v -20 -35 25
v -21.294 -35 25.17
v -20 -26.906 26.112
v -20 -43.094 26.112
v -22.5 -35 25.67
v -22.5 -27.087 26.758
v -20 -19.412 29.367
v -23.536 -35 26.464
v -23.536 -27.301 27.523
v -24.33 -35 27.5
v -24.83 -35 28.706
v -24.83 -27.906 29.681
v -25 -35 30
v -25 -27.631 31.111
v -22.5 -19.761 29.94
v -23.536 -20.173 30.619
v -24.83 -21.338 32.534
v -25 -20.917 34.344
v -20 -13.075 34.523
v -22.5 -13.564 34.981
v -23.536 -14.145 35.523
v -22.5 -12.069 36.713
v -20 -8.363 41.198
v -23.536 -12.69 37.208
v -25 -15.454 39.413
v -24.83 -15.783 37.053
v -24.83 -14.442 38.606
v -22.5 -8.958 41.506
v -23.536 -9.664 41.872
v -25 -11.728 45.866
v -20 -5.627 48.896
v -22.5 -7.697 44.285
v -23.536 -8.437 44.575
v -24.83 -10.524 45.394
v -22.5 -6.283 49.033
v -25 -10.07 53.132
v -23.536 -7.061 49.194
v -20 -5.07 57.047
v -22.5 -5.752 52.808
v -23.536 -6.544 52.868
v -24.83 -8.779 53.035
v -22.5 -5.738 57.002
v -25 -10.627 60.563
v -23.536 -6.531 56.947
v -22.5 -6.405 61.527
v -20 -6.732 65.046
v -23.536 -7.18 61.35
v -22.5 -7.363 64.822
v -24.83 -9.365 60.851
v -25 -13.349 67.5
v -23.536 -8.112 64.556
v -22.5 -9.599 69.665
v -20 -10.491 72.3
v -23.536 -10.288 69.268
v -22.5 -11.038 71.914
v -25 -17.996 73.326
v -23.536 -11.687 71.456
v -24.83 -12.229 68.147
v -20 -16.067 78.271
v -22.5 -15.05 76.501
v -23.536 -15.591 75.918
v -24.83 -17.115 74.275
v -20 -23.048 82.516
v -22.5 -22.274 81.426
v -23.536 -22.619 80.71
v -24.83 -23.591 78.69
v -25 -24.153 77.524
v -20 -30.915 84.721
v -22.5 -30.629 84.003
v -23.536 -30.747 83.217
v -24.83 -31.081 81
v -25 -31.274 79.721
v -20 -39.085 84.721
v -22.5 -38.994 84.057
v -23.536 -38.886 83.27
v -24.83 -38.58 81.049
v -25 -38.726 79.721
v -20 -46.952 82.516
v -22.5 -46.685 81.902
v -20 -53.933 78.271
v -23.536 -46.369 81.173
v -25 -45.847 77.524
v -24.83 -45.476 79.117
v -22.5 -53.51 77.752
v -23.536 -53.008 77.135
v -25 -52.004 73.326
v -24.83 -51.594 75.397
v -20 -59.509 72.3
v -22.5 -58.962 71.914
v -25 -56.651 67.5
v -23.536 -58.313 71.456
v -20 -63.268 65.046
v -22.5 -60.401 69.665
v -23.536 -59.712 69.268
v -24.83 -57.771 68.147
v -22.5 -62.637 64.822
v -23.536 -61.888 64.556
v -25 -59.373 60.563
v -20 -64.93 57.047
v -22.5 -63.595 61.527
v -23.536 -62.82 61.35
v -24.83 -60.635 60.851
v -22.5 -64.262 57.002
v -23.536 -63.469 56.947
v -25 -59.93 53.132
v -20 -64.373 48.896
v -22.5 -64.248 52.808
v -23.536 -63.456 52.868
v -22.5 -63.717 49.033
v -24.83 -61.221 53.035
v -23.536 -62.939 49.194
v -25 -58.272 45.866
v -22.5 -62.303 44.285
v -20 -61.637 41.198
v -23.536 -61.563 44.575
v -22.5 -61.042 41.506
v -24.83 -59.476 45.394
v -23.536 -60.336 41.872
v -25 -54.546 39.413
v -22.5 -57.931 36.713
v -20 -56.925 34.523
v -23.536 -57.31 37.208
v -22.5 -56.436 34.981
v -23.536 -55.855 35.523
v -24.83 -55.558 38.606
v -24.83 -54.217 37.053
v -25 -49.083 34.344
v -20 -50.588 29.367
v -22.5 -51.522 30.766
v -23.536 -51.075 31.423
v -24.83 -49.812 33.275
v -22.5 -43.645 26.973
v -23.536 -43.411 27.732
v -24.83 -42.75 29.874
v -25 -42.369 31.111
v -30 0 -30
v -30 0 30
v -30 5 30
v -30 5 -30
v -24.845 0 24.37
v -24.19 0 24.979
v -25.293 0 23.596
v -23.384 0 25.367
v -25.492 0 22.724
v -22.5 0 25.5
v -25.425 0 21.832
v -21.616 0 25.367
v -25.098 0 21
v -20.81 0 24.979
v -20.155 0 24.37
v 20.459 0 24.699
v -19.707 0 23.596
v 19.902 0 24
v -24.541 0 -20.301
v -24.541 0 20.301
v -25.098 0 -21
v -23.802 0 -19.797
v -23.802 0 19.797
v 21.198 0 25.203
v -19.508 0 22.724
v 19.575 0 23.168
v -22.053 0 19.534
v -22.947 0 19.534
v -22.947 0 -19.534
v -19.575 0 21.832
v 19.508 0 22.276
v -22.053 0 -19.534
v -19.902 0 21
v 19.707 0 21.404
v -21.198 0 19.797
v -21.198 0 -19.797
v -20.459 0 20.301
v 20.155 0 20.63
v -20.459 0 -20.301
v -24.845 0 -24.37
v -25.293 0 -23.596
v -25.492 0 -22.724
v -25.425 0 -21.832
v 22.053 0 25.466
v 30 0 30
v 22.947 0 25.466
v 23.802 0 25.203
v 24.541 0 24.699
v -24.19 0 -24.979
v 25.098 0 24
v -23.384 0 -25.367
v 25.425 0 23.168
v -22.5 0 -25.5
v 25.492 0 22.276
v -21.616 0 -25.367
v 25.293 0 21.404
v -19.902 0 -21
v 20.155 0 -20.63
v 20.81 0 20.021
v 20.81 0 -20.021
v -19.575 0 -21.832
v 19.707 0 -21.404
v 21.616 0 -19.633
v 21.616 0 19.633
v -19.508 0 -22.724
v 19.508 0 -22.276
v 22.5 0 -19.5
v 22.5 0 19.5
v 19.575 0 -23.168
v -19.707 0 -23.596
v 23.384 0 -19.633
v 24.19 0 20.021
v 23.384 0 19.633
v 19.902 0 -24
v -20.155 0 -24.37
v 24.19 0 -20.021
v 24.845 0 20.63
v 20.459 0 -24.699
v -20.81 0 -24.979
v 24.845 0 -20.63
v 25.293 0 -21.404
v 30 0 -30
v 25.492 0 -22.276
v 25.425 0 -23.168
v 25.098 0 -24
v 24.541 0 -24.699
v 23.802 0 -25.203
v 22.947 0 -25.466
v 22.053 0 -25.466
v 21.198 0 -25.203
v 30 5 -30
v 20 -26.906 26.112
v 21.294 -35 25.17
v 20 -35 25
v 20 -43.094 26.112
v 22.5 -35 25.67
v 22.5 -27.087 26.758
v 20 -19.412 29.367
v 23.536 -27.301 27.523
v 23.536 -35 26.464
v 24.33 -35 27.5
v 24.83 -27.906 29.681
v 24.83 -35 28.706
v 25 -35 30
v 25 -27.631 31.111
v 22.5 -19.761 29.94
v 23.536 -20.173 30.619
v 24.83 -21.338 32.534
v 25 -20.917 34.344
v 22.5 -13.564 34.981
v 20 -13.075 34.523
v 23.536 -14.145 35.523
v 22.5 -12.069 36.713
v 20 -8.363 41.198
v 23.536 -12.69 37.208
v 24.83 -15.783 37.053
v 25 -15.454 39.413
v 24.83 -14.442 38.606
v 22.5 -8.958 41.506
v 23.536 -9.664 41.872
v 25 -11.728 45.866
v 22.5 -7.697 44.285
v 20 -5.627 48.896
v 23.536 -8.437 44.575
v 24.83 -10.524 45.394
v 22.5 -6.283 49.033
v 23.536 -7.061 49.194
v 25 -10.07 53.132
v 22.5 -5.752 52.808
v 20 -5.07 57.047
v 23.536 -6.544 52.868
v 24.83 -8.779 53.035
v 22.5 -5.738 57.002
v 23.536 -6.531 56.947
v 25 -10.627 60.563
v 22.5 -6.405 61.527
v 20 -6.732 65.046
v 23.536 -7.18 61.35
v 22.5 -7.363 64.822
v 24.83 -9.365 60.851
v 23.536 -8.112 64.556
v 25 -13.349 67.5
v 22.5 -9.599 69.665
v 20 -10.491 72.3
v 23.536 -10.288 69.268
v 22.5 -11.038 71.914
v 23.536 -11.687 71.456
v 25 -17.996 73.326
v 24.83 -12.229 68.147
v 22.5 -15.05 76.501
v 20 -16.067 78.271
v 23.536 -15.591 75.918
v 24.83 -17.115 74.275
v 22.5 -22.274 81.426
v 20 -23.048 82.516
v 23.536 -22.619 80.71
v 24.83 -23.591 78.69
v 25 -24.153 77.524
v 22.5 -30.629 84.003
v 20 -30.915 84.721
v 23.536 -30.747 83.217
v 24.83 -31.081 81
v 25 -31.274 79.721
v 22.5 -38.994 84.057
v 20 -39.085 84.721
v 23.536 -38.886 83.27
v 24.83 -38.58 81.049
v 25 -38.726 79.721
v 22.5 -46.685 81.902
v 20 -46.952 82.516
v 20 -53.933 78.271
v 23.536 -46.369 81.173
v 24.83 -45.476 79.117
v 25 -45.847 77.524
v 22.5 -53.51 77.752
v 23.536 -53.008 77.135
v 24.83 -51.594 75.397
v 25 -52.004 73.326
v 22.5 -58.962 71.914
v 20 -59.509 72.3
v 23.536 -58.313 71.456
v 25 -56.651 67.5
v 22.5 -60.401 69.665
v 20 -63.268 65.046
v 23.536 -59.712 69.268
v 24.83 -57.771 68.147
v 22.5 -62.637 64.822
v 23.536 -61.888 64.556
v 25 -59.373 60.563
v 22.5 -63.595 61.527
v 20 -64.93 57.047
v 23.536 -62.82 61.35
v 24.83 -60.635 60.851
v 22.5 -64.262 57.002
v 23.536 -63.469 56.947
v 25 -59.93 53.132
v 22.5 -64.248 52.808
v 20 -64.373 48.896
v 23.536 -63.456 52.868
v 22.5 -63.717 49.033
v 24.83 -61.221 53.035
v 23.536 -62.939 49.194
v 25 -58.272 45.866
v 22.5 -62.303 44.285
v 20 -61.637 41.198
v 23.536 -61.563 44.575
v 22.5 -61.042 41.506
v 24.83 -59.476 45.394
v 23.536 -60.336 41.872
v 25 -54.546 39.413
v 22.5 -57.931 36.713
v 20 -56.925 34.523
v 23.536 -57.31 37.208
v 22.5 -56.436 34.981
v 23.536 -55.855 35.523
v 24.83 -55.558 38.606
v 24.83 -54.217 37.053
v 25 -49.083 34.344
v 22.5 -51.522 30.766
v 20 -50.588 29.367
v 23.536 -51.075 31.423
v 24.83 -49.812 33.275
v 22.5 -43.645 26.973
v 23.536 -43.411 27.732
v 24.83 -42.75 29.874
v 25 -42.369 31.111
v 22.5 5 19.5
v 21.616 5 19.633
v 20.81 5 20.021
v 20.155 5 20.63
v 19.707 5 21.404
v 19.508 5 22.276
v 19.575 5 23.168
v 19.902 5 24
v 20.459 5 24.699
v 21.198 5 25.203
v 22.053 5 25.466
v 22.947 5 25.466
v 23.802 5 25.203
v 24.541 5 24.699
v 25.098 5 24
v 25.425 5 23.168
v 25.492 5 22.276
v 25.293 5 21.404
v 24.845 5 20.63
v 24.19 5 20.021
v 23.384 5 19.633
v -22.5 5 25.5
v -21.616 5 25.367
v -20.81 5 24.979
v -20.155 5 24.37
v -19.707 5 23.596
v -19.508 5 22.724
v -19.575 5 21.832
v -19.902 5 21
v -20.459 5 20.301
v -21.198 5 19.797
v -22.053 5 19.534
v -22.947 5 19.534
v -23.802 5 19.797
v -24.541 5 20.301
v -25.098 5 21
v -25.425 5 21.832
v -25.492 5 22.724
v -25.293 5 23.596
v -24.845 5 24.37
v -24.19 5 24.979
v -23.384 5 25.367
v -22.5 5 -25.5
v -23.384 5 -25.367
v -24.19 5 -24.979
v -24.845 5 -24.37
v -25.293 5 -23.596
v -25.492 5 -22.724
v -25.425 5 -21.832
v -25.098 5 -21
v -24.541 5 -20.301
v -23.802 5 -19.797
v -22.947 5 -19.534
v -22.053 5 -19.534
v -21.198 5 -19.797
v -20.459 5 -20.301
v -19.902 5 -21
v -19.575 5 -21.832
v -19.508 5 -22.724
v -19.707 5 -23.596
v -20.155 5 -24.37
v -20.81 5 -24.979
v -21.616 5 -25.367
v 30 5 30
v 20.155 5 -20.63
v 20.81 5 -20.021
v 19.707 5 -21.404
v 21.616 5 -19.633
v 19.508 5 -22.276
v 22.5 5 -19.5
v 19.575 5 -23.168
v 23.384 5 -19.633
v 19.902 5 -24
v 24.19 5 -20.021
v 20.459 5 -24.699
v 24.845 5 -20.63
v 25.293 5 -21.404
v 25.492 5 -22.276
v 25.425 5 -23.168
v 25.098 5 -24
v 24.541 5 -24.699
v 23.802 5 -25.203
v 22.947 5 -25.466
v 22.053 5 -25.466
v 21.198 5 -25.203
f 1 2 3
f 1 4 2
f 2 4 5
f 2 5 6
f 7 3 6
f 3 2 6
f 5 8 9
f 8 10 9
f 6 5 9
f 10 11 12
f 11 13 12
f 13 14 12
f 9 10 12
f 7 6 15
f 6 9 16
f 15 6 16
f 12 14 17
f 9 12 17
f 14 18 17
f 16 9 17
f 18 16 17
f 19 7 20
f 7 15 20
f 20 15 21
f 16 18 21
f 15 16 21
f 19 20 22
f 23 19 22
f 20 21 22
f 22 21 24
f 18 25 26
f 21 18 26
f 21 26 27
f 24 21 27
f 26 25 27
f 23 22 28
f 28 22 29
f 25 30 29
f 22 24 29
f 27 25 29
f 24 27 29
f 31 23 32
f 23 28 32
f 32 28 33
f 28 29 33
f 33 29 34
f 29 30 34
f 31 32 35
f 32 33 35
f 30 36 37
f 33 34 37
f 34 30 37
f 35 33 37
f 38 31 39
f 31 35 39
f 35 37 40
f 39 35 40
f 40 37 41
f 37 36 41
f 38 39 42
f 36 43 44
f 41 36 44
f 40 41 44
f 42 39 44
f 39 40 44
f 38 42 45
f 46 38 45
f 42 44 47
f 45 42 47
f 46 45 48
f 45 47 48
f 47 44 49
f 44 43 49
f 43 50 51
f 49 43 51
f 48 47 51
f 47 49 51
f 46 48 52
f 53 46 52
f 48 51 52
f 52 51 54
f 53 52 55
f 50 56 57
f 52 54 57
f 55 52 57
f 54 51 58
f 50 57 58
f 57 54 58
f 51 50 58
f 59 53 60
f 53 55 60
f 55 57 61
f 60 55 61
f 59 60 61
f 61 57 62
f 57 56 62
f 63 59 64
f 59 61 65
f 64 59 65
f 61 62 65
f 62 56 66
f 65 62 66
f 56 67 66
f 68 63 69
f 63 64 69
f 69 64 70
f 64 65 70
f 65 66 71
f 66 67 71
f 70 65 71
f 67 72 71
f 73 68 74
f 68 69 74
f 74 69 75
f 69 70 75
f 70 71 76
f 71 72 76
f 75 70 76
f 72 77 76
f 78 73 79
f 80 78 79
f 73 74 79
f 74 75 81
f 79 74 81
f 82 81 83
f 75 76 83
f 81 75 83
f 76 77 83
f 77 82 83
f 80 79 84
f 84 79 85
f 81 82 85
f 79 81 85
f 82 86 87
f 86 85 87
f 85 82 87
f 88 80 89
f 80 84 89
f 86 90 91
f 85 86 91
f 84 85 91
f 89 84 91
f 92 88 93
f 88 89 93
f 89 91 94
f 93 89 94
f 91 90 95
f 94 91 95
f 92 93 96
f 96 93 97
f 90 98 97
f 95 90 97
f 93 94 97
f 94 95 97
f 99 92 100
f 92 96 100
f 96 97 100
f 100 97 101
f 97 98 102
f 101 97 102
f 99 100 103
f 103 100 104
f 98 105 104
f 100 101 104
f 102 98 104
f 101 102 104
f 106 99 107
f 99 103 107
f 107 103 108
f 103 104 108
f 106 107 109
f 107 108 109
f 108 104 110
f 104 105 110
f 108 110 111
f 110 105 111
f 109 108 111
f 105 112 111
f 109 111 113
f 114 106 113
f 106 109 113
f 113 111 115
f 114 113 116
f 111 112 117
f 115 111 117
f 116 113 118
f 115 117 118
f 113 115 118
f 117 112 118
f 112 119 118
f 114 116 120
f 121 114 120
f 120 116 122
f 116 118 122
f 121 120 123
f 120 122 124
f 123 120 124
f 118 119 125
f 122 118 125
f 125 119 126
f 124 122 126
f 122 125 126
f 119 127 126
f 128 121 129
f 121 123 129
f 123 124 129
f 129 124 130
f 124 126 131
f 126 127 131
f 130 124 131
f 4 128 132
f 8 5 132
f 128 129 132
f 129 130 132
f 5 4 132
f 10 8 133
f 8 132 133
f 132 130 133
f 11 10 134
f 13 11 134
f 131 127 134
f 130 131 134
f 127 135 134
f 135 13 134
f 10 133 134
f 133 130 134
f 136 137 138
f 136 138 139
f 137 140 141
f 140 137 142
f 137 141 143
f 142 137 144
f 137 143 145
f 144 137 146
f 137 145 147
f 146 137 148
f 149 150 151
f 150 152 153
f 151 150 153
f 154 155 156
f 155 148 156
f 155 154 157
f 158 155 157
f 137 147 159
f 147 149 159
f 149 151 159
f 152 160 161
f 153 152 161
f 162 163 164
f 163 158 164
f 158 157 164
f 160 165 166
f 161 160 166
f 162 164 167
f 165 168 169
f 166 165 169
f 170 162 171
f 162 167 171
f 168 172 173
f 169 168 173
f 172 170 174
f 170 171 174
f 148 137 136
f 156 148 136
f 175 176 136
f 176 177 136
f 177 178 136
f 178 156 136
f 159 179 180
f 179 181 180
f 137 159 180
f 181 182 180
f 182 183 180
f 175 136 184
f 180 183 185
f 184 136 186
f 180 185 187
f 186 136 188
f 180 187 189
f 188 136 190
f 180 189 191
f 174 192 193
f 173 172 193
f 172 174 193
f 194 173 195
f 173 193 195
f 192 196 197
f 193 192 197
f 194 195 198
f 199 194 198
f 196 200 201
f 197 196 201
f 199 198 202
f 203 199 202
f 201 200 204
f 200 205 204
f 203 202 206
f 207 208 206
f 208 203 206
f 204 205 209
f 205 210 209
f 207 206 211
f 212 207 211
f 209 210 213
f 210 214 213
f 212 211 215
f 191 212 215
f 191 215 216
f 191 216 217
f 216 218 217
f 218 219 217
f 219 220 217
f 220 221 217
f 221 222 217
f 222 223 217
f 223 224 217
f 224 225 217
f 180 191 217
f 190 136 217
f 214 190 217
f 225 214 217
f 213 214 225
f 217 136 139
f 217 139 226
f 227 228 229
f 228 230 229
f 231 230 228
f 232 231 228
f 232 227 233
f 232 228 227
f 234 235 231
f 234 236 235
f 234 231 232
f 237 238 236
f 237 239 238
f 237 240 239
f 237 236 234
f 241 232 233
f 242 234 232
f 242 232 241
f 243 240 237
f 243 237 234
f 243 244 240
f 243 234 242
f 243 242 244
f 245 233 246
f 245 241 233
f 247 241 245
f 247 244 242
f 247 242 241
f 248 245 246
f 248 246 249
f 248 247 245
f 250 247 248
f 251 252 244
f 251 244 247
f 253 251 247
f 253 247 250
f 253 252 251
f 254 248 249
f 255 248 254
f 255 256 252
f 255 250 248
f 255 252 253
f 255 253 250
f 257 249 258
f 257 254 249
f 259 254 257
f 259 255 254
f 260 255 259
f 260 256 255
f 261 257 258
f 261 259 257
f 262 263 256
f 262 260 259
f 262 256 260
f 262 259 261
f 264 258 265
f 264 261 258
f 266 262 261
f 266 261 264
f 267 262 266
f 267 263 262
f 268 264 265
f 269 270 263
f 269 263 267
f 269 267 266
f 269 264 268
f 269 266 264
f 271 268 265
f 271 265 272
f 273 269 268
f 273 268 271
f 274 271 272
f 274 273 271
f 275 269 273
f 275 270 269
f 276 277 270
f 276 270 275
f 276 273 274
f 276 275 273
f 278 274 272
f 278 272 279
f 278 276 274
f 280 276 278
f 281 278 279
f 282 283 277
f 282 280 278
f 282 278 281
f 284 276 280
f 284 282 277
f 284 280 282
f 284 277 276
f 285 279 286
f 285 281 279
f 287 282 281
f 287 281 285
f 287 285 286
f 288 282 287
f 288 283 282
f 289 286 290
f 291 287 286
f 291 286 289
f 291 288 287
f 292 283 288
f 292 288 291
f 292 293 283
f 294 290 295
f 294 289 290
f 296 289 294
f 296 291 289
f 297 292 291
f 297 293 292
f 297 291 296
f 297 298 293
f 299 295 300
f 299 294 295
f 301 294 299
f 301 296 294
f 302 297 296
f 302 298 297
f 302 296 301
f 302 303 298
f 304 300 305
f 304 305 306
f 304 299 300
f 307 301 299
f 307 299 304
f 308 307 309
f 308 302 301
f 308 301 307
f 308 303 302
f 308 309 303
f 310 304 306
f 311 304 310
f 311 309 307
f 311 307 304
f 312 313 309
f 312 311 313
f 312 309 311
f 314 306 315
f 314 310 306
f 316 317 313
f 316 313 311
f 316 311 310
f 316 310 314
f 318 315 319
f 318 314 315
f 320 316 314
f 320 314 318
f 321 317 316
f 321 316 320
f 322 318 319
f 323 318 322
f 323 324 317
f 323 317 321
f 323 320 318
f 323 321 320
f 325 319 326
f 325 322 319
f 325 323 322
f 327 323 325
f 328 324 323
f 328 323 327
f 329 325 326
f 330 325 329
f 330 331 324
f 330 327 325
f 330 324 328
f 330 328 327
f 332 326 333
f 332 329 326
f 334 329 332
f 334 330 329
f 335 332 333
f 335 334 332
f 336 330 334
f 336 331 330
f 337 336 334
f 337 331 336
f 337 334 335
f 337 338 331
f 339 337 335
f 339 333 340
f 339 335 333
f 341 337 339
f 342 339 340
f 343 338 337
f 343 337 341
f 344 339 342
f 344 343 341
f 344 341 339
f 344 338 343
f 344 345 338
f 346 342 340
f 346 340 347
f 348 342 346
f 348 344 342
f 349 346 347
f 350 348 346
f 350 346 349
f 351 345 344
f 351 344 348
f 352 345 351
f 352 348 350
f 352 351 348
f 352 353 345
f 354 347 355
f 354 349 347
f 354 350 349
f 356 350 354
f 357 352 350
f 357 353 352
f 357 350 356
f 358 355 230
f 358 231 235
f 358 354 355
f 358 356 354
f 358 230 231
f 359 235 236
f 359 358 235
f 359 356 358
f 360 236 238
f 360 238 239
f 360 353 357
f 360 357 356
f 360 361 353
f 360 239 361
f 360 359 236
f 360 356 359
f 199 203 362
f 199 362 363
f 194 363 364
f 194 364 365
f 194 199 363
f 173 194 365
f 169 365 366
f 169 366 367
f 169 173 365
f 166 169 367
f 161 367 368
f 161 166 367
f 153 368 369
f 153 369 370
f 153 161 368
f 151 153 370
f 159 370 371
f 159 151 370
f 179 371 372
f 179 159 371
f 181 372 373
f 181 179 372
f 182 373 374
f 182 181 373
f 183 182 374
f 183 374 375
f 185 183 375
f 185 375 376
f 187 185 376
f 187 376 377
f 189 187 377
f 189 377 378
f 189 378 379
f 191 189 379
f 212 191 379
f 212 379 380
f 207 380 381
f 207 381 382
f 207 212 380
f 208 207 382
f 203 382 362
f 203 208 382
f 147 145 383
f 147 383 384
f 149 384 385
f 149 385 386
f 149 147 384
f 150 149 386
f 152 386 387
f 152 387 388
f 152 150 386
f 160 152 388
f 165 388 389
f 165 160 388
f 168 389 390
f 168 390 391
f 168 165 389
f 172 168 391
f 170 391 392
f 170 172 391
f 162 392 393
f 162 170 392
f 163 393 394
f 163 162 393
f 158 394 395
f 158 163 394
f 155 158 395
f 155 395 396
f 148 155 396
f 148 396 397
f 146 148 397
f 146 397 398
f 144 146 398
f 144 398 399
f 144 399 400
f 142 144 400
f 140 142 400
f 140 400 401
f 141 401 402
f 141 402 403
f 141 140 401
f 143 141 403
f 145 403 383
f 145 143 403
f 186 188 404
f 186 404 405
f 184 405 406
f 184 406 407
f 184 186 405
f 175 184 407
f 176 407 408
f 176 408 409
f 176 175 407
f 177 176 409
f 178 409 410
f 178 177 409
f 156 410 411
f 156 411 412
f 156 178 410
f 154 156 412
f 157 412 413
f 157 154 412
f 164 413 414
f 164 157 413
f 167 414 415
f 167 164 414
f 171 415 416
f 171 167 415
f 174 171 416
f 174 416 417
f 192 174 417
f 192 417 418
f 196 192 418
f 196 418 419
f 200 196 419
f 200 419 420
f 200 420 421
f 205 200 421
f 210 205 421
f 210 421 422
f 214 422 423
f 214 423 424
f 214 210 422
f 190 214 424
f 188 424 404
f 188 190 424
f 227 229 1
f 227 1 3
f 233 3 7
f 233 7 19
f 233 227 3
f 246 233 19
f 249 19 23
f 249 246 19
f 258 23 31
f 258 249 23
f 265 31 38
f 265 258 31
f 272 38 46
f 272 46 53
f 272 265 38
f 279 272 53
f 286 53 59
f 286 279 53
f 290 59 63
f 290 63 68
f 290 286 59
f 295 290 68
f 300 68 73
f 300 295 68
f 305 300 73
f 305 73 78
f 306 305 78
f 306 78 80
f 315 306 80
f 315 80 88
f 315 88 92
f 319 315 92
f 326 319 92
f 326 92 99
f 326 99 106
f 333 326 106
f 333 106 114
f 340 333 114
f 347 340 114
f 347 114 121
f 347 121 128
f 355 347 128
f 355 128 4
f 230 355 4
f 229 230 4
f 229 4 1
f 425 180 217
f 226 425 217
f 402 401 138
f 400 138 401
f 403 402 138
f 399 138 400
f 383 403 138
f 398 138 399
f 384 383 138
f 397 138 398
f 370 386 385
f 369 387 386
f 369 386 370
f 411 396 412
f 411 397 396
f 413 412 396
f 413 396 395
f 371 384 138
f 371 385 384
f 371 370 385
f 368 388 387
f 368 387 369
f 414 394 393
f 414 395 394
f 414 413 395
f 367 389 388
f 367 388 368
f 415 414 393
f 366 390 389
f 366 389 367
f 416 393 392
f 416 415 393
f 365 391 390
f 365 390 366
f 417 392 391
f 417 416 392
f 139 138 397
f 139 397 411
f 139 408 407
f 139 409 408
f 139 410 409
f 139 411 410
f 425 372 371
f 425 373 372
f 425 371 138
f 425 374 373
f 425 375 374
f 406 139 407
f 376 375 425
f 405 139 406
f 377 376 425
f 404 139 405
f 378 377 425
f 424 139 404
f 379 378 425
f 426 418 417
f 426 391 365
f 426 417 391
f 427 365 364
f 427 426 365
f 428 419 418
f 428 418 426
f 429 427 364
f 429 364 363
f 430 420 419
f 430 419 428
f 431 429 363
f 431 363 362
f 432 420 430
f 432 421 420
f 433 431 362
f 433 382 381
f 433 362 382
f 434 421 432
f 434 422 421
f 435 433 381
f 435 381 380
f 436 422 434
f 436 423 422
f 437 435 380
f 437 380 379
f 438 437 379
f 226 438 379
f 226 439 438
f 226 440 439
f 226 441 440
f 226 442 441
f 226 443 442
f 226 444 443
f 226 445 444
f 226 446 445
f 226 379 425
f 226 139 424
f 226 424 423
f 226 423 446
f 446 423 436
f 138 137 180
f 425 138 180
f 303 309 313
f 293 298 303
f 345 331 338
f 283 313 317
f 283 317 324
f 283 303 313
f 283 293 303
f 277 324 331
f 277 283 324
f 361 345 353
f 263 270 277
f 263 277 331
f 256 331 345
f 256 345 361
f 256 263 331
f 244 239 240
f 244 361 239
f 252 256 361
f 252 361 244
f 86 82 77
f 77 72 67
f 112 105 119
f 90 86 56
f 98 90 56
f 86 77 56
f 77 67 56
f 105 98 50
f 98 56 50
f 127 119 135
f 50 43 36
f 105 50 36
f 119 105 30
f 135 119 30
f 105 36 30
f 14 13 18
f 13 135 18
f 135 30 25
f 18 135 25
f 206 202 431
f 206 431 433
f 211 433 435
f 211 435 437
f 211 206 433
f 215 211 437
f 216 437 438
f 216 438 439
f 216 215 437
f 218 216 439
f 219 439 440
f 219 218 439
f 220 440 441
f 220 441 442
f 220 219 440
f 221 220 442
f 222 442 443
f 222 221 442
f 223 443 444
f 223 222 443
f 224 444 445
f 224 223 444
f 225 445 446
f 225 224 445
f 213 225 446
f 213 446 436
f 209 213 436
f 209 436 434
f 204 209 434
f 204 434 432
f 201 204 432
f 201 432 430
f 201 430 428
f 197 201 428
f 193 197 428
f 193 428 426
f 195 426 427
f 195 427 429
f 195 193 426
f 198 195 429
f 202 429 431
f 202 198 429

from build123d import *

# Parameters (mm, degrees)
SKETCH1_W           = 60
SKETCH1_H           = 60
SKETCH1_R           = 3
BOSS_EXTRUDE1_DEPTH = 5
SKETCH2_R           = 30
BOSS_EXTRUDE2_DEPTH = 25
FILLET1_R           = 5


with BuildPart() as part:
    # Sketch1 → Boss-Extrude1 (new body)
    with BuildSketch(Plane(origin=(0, 0, 0), x_dir=(1, 0, 0), z_dir=(0, 1, 0))):
        Rectangle(SKETCH1_W, SKETCH1_H)
        with Locations((22.5, 22.5)):
            Circle(SKETCH1_R, mode=Mode.SUBTRACT)
        with Locations((-22.5, 22.5)):
            Circle(SKETCH1_R, mode=Mode.SUBTRACT)
        with Locations((22.5, -22.5)):
            Circle(SKETCH1_R, mode=Mode.SUBTRACT)
        with Locations((-22.5, -22.5)):
            Circle(SKETCH1_R, mode=Mode.SUBTRACT)
    extrude(amount=BOSS_EXTRUDE1_DEPTH)


with BuildPart() as body_2:
    # Sketch2 → Boss-Extrude2 (new, symmetric)
    with BuildSketch(Plane(origin=(0, 0, 0), x_dir=(0, 0, -1), z_dir=(1, 0, 0))):
        with Locations((-55, -35)):
            Circle(SKETCH2_R)
    extrude(amount=BOSS_EXTRUDE2_DEPTH, both=True)

    # Fillet1
    fillet1_edges = [body_2.edges().sort_by_distance(p)[0] for p in [
        (-25, -35, 85),
        (25, -35, 85),
    ]]
    fillet(fillet1_edges, radius=FILLET1_R)


solid = Compound([part.part, body_2.part])
